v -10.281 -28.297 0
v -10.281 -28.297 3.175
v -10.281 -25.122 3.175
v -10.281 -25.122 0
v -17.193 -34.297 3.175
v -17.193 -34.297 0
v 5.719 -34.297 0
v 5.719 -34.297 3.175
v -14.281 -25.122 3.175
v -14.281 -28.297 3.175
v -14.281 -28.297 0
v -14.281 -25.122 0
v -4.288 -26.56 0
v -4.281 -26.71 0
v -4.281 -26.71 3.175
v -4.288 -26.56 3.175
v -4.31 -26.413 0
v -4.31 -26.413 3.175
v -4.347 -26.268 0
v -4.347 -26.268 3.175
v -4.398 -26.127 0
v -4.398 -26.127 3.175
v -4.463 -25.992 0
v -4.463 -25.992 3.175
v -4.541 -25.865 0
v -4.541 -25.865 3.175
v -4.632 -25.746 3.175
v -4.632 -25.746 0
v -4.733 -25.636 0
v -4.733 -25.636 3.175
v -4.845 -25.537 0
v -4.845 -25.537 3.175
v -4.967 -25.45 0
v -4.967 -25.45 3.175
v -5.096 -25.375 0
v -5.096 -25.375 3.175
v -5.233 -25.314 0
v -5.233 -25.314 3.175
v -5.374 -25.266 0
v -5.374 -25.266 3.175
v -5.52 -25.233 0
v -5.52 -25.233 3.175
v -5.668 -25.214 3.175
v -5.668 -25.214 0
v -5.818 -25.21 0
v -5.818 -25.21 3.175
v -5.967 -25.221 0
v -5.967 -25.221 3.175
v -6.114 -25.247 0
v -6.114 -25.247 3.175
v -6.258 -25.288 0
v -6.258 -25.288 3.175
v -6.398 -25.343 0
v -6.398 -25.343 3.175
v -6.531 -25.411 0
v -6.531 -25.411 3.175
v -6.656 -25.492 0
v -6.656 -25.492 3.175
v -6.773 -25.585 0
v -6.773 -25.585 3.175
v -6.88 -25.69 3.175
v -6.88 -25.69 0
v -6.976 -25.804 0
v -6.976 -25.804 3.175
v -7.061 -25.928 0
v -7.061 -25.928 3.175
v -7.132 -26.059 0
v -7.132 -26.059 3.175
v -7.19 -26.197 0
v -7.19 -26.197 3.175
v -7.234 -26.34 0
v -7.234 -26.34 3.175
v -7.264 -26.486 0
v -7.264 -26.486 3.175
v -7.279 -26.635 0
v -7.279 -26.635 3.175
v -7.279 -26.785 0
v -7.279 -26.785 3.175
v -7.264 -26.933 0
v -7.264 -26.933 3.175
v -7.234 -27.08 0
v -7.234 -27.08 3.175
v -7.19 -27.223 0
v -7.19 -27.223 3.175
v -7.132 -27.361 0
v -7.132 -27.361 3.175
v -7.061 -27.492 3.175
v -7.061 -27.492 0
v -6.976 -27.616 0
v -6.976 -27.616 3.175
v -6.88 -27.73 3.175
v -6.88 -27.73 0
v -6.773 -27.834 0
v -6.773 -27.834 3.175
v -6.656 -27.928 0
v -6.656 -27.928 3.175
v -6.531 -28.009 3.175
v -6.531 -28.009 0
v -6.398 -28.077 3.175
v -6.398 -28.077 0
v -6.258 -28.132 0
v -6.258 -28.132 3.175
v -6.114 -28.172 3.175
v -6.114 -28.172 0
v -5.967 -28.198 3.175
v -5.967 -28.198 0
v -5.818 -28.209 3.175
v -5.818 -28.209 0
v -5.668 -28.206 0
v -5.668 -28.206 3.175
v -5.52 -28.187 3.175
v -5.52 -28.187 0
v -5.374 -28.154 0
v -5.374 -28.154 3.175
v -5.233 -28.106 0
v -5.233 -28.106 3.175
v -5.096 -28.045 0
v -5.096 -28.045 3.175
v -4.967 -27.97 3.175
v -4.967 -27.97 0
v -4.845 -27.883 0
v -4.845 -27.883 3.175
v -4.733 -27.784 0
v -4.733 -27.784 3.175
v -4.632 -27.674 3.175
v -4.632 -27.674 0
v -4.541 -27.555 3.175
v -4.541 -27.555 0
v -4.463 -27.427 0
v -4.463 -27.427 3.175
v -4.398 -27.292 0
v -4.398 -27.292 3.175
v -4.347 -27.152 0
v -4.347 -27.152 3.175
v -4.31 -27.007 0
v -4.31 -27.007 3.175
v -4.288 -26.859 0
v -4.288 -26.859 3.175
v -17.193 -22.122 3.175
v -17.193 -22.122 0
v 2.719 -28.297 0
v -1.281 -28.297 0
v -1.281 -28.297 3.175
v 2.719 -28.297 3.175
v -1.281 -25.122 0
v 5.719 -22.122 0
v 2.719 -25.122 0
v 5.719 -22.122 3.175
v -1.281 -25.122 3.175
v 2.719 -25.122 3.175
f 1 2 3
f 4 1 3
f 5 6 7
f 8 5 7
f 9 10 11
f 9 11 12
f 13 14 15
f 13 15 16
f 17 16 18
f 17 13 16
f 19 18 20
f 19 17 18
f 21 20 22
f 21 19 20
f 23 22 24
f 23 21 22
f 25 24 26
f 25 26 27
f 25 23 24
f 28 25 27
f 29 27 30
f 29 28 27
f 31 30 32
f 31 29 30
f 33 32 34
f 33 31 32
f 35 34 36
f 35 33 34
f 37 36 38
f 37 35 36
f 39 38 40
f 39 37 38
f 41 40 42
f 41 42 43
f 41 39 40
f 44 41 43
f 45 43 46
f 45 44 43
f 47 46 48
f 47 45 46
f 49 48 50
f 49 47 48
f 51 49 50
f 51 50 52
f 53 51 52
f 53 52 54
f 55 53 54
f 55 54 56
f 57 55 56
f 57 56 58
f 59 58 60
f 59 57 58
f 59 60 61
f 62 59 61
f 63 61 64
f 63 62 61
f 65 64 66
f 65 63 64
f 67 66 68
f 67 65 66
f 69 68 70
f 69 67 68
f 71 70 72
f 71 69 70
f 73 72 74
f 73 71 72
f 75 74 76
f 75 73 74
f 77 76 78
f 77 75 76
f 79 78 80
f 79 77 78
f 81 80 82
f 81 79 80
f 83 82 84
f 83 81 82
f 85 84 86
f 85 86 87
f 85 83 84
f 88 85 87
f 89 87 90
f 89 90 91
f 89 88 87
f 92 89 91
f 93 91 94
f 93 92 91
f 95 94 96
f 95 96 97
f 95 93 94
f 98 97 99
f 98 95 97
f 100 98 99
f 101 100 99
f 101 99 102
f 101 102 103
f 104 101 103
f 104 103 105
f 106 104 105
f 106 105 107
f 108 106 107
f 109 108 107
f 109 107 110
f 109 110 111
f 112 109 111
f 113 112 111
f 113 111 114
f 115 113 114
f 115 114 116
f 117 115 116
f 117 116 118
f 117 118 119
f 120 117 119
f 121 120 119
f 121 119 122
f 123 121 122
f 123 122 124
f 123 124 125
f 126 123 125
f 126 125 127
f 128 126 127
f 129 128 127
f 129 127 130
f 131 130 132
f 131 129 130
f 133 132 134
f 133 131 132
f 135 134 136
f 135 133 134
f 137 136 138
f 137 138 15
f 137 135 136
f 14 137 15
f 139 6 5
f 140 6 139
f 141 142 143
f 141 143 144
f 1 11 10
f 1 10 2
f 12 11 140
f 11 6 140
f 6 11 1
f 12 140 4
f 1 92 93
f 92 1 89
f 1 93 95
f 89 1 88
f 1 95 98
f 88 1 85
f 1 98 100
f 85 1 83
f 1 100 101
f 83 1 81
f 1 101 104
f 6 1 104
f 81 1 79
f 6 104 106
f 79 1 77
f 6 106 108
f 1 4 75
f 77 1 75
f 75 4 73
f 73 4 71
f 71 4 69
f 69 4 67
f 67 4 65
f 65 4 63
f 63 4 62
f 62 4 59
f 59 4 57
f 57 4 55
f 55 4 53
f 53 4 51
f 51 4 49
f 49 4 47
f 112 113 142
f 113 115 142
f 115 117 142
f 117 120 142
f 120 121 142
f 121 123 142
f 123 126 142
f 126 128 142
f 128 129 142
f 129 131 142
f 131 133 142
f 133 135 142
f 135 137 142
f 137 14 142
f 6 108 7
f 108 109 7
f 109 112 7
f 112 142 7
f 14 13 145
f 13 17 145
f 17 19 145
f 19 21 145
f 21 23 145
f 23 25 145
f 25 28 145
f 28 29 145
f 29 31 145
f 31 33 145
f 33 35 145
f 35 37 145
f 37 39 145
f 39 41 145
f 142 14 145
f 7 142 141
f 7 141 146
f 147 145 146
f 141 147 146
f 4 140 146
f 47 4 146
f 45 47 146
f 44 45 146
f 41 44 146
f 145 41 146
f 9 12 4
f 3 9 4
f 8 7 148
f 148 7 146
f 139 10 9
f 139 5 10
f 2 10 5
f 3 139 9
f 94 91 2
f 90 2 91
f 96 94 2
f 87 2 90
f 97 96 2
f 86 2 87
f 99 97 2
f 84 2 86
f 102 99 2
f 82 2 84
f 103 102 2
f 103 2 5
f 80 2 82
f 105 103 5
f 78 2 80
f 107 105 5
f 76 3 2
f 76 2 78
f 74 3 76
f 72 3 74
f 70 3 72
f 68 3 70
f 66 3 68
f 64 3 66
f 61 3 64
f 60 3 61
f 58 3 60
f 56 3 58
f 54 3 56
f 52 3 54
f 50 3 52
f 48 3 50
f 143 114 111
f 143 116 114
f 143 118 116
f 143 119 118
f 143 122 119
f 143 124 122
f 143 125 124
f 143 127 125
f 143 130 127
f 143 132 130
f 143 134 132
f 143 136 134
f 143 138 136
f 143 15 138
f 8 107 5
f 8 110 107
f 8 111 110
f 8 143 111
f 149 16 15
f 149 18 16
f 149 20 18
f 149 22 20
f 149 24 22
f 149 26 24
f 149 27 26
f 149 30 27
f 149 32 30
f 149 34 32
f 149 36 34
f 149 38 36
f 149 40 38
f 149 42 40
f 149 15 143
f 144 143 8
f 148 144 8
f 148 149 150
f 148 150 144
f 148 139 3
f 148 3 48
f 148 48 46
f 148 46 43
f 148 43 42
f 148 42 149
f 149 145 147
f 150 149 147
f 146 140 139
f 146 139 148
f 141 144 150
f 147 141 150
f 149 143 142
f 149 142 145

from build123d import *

# Parameters (mm, degrees)
F0_W     = 22.9125
F0_H     = 12.175
F0_W_2   = 4
F0_H_2   = 3.175
F0_R     = 1.5
F1_DEPTH = 3.175


# Not quite as in the source:
# - a length typed as a fraction of an inch, garbled in the dataset ("3 / 203.2 mm" for 3/8 in), is restored


with BuildPart() as f1:
    # F0 (on Top) → F1 (new body)
    with BuildSketch(Plane.XY):
        with Locations((-5.7368283796, -28.2098180865)):
            Rectangle(F0_W, F0_H)
        with Locations((-12.2805783796, -26.7098180865)):
            Rectangle(F0_W_2, F0_H_2, mode=Mode.SUBTRACT)
        with Locations((-5.7805783796, -26.7098180865)):
            Circle(F0_R, mode=Mode.SUBTRACT)
        with Locations((0.7194216204, -26.7098180865)):
            Rectangle(F0_W_2, F0_H_2, mode=Mode.SUBTRACT)
    extrude(amount=F1_DEPTH)


solid = f1.part
